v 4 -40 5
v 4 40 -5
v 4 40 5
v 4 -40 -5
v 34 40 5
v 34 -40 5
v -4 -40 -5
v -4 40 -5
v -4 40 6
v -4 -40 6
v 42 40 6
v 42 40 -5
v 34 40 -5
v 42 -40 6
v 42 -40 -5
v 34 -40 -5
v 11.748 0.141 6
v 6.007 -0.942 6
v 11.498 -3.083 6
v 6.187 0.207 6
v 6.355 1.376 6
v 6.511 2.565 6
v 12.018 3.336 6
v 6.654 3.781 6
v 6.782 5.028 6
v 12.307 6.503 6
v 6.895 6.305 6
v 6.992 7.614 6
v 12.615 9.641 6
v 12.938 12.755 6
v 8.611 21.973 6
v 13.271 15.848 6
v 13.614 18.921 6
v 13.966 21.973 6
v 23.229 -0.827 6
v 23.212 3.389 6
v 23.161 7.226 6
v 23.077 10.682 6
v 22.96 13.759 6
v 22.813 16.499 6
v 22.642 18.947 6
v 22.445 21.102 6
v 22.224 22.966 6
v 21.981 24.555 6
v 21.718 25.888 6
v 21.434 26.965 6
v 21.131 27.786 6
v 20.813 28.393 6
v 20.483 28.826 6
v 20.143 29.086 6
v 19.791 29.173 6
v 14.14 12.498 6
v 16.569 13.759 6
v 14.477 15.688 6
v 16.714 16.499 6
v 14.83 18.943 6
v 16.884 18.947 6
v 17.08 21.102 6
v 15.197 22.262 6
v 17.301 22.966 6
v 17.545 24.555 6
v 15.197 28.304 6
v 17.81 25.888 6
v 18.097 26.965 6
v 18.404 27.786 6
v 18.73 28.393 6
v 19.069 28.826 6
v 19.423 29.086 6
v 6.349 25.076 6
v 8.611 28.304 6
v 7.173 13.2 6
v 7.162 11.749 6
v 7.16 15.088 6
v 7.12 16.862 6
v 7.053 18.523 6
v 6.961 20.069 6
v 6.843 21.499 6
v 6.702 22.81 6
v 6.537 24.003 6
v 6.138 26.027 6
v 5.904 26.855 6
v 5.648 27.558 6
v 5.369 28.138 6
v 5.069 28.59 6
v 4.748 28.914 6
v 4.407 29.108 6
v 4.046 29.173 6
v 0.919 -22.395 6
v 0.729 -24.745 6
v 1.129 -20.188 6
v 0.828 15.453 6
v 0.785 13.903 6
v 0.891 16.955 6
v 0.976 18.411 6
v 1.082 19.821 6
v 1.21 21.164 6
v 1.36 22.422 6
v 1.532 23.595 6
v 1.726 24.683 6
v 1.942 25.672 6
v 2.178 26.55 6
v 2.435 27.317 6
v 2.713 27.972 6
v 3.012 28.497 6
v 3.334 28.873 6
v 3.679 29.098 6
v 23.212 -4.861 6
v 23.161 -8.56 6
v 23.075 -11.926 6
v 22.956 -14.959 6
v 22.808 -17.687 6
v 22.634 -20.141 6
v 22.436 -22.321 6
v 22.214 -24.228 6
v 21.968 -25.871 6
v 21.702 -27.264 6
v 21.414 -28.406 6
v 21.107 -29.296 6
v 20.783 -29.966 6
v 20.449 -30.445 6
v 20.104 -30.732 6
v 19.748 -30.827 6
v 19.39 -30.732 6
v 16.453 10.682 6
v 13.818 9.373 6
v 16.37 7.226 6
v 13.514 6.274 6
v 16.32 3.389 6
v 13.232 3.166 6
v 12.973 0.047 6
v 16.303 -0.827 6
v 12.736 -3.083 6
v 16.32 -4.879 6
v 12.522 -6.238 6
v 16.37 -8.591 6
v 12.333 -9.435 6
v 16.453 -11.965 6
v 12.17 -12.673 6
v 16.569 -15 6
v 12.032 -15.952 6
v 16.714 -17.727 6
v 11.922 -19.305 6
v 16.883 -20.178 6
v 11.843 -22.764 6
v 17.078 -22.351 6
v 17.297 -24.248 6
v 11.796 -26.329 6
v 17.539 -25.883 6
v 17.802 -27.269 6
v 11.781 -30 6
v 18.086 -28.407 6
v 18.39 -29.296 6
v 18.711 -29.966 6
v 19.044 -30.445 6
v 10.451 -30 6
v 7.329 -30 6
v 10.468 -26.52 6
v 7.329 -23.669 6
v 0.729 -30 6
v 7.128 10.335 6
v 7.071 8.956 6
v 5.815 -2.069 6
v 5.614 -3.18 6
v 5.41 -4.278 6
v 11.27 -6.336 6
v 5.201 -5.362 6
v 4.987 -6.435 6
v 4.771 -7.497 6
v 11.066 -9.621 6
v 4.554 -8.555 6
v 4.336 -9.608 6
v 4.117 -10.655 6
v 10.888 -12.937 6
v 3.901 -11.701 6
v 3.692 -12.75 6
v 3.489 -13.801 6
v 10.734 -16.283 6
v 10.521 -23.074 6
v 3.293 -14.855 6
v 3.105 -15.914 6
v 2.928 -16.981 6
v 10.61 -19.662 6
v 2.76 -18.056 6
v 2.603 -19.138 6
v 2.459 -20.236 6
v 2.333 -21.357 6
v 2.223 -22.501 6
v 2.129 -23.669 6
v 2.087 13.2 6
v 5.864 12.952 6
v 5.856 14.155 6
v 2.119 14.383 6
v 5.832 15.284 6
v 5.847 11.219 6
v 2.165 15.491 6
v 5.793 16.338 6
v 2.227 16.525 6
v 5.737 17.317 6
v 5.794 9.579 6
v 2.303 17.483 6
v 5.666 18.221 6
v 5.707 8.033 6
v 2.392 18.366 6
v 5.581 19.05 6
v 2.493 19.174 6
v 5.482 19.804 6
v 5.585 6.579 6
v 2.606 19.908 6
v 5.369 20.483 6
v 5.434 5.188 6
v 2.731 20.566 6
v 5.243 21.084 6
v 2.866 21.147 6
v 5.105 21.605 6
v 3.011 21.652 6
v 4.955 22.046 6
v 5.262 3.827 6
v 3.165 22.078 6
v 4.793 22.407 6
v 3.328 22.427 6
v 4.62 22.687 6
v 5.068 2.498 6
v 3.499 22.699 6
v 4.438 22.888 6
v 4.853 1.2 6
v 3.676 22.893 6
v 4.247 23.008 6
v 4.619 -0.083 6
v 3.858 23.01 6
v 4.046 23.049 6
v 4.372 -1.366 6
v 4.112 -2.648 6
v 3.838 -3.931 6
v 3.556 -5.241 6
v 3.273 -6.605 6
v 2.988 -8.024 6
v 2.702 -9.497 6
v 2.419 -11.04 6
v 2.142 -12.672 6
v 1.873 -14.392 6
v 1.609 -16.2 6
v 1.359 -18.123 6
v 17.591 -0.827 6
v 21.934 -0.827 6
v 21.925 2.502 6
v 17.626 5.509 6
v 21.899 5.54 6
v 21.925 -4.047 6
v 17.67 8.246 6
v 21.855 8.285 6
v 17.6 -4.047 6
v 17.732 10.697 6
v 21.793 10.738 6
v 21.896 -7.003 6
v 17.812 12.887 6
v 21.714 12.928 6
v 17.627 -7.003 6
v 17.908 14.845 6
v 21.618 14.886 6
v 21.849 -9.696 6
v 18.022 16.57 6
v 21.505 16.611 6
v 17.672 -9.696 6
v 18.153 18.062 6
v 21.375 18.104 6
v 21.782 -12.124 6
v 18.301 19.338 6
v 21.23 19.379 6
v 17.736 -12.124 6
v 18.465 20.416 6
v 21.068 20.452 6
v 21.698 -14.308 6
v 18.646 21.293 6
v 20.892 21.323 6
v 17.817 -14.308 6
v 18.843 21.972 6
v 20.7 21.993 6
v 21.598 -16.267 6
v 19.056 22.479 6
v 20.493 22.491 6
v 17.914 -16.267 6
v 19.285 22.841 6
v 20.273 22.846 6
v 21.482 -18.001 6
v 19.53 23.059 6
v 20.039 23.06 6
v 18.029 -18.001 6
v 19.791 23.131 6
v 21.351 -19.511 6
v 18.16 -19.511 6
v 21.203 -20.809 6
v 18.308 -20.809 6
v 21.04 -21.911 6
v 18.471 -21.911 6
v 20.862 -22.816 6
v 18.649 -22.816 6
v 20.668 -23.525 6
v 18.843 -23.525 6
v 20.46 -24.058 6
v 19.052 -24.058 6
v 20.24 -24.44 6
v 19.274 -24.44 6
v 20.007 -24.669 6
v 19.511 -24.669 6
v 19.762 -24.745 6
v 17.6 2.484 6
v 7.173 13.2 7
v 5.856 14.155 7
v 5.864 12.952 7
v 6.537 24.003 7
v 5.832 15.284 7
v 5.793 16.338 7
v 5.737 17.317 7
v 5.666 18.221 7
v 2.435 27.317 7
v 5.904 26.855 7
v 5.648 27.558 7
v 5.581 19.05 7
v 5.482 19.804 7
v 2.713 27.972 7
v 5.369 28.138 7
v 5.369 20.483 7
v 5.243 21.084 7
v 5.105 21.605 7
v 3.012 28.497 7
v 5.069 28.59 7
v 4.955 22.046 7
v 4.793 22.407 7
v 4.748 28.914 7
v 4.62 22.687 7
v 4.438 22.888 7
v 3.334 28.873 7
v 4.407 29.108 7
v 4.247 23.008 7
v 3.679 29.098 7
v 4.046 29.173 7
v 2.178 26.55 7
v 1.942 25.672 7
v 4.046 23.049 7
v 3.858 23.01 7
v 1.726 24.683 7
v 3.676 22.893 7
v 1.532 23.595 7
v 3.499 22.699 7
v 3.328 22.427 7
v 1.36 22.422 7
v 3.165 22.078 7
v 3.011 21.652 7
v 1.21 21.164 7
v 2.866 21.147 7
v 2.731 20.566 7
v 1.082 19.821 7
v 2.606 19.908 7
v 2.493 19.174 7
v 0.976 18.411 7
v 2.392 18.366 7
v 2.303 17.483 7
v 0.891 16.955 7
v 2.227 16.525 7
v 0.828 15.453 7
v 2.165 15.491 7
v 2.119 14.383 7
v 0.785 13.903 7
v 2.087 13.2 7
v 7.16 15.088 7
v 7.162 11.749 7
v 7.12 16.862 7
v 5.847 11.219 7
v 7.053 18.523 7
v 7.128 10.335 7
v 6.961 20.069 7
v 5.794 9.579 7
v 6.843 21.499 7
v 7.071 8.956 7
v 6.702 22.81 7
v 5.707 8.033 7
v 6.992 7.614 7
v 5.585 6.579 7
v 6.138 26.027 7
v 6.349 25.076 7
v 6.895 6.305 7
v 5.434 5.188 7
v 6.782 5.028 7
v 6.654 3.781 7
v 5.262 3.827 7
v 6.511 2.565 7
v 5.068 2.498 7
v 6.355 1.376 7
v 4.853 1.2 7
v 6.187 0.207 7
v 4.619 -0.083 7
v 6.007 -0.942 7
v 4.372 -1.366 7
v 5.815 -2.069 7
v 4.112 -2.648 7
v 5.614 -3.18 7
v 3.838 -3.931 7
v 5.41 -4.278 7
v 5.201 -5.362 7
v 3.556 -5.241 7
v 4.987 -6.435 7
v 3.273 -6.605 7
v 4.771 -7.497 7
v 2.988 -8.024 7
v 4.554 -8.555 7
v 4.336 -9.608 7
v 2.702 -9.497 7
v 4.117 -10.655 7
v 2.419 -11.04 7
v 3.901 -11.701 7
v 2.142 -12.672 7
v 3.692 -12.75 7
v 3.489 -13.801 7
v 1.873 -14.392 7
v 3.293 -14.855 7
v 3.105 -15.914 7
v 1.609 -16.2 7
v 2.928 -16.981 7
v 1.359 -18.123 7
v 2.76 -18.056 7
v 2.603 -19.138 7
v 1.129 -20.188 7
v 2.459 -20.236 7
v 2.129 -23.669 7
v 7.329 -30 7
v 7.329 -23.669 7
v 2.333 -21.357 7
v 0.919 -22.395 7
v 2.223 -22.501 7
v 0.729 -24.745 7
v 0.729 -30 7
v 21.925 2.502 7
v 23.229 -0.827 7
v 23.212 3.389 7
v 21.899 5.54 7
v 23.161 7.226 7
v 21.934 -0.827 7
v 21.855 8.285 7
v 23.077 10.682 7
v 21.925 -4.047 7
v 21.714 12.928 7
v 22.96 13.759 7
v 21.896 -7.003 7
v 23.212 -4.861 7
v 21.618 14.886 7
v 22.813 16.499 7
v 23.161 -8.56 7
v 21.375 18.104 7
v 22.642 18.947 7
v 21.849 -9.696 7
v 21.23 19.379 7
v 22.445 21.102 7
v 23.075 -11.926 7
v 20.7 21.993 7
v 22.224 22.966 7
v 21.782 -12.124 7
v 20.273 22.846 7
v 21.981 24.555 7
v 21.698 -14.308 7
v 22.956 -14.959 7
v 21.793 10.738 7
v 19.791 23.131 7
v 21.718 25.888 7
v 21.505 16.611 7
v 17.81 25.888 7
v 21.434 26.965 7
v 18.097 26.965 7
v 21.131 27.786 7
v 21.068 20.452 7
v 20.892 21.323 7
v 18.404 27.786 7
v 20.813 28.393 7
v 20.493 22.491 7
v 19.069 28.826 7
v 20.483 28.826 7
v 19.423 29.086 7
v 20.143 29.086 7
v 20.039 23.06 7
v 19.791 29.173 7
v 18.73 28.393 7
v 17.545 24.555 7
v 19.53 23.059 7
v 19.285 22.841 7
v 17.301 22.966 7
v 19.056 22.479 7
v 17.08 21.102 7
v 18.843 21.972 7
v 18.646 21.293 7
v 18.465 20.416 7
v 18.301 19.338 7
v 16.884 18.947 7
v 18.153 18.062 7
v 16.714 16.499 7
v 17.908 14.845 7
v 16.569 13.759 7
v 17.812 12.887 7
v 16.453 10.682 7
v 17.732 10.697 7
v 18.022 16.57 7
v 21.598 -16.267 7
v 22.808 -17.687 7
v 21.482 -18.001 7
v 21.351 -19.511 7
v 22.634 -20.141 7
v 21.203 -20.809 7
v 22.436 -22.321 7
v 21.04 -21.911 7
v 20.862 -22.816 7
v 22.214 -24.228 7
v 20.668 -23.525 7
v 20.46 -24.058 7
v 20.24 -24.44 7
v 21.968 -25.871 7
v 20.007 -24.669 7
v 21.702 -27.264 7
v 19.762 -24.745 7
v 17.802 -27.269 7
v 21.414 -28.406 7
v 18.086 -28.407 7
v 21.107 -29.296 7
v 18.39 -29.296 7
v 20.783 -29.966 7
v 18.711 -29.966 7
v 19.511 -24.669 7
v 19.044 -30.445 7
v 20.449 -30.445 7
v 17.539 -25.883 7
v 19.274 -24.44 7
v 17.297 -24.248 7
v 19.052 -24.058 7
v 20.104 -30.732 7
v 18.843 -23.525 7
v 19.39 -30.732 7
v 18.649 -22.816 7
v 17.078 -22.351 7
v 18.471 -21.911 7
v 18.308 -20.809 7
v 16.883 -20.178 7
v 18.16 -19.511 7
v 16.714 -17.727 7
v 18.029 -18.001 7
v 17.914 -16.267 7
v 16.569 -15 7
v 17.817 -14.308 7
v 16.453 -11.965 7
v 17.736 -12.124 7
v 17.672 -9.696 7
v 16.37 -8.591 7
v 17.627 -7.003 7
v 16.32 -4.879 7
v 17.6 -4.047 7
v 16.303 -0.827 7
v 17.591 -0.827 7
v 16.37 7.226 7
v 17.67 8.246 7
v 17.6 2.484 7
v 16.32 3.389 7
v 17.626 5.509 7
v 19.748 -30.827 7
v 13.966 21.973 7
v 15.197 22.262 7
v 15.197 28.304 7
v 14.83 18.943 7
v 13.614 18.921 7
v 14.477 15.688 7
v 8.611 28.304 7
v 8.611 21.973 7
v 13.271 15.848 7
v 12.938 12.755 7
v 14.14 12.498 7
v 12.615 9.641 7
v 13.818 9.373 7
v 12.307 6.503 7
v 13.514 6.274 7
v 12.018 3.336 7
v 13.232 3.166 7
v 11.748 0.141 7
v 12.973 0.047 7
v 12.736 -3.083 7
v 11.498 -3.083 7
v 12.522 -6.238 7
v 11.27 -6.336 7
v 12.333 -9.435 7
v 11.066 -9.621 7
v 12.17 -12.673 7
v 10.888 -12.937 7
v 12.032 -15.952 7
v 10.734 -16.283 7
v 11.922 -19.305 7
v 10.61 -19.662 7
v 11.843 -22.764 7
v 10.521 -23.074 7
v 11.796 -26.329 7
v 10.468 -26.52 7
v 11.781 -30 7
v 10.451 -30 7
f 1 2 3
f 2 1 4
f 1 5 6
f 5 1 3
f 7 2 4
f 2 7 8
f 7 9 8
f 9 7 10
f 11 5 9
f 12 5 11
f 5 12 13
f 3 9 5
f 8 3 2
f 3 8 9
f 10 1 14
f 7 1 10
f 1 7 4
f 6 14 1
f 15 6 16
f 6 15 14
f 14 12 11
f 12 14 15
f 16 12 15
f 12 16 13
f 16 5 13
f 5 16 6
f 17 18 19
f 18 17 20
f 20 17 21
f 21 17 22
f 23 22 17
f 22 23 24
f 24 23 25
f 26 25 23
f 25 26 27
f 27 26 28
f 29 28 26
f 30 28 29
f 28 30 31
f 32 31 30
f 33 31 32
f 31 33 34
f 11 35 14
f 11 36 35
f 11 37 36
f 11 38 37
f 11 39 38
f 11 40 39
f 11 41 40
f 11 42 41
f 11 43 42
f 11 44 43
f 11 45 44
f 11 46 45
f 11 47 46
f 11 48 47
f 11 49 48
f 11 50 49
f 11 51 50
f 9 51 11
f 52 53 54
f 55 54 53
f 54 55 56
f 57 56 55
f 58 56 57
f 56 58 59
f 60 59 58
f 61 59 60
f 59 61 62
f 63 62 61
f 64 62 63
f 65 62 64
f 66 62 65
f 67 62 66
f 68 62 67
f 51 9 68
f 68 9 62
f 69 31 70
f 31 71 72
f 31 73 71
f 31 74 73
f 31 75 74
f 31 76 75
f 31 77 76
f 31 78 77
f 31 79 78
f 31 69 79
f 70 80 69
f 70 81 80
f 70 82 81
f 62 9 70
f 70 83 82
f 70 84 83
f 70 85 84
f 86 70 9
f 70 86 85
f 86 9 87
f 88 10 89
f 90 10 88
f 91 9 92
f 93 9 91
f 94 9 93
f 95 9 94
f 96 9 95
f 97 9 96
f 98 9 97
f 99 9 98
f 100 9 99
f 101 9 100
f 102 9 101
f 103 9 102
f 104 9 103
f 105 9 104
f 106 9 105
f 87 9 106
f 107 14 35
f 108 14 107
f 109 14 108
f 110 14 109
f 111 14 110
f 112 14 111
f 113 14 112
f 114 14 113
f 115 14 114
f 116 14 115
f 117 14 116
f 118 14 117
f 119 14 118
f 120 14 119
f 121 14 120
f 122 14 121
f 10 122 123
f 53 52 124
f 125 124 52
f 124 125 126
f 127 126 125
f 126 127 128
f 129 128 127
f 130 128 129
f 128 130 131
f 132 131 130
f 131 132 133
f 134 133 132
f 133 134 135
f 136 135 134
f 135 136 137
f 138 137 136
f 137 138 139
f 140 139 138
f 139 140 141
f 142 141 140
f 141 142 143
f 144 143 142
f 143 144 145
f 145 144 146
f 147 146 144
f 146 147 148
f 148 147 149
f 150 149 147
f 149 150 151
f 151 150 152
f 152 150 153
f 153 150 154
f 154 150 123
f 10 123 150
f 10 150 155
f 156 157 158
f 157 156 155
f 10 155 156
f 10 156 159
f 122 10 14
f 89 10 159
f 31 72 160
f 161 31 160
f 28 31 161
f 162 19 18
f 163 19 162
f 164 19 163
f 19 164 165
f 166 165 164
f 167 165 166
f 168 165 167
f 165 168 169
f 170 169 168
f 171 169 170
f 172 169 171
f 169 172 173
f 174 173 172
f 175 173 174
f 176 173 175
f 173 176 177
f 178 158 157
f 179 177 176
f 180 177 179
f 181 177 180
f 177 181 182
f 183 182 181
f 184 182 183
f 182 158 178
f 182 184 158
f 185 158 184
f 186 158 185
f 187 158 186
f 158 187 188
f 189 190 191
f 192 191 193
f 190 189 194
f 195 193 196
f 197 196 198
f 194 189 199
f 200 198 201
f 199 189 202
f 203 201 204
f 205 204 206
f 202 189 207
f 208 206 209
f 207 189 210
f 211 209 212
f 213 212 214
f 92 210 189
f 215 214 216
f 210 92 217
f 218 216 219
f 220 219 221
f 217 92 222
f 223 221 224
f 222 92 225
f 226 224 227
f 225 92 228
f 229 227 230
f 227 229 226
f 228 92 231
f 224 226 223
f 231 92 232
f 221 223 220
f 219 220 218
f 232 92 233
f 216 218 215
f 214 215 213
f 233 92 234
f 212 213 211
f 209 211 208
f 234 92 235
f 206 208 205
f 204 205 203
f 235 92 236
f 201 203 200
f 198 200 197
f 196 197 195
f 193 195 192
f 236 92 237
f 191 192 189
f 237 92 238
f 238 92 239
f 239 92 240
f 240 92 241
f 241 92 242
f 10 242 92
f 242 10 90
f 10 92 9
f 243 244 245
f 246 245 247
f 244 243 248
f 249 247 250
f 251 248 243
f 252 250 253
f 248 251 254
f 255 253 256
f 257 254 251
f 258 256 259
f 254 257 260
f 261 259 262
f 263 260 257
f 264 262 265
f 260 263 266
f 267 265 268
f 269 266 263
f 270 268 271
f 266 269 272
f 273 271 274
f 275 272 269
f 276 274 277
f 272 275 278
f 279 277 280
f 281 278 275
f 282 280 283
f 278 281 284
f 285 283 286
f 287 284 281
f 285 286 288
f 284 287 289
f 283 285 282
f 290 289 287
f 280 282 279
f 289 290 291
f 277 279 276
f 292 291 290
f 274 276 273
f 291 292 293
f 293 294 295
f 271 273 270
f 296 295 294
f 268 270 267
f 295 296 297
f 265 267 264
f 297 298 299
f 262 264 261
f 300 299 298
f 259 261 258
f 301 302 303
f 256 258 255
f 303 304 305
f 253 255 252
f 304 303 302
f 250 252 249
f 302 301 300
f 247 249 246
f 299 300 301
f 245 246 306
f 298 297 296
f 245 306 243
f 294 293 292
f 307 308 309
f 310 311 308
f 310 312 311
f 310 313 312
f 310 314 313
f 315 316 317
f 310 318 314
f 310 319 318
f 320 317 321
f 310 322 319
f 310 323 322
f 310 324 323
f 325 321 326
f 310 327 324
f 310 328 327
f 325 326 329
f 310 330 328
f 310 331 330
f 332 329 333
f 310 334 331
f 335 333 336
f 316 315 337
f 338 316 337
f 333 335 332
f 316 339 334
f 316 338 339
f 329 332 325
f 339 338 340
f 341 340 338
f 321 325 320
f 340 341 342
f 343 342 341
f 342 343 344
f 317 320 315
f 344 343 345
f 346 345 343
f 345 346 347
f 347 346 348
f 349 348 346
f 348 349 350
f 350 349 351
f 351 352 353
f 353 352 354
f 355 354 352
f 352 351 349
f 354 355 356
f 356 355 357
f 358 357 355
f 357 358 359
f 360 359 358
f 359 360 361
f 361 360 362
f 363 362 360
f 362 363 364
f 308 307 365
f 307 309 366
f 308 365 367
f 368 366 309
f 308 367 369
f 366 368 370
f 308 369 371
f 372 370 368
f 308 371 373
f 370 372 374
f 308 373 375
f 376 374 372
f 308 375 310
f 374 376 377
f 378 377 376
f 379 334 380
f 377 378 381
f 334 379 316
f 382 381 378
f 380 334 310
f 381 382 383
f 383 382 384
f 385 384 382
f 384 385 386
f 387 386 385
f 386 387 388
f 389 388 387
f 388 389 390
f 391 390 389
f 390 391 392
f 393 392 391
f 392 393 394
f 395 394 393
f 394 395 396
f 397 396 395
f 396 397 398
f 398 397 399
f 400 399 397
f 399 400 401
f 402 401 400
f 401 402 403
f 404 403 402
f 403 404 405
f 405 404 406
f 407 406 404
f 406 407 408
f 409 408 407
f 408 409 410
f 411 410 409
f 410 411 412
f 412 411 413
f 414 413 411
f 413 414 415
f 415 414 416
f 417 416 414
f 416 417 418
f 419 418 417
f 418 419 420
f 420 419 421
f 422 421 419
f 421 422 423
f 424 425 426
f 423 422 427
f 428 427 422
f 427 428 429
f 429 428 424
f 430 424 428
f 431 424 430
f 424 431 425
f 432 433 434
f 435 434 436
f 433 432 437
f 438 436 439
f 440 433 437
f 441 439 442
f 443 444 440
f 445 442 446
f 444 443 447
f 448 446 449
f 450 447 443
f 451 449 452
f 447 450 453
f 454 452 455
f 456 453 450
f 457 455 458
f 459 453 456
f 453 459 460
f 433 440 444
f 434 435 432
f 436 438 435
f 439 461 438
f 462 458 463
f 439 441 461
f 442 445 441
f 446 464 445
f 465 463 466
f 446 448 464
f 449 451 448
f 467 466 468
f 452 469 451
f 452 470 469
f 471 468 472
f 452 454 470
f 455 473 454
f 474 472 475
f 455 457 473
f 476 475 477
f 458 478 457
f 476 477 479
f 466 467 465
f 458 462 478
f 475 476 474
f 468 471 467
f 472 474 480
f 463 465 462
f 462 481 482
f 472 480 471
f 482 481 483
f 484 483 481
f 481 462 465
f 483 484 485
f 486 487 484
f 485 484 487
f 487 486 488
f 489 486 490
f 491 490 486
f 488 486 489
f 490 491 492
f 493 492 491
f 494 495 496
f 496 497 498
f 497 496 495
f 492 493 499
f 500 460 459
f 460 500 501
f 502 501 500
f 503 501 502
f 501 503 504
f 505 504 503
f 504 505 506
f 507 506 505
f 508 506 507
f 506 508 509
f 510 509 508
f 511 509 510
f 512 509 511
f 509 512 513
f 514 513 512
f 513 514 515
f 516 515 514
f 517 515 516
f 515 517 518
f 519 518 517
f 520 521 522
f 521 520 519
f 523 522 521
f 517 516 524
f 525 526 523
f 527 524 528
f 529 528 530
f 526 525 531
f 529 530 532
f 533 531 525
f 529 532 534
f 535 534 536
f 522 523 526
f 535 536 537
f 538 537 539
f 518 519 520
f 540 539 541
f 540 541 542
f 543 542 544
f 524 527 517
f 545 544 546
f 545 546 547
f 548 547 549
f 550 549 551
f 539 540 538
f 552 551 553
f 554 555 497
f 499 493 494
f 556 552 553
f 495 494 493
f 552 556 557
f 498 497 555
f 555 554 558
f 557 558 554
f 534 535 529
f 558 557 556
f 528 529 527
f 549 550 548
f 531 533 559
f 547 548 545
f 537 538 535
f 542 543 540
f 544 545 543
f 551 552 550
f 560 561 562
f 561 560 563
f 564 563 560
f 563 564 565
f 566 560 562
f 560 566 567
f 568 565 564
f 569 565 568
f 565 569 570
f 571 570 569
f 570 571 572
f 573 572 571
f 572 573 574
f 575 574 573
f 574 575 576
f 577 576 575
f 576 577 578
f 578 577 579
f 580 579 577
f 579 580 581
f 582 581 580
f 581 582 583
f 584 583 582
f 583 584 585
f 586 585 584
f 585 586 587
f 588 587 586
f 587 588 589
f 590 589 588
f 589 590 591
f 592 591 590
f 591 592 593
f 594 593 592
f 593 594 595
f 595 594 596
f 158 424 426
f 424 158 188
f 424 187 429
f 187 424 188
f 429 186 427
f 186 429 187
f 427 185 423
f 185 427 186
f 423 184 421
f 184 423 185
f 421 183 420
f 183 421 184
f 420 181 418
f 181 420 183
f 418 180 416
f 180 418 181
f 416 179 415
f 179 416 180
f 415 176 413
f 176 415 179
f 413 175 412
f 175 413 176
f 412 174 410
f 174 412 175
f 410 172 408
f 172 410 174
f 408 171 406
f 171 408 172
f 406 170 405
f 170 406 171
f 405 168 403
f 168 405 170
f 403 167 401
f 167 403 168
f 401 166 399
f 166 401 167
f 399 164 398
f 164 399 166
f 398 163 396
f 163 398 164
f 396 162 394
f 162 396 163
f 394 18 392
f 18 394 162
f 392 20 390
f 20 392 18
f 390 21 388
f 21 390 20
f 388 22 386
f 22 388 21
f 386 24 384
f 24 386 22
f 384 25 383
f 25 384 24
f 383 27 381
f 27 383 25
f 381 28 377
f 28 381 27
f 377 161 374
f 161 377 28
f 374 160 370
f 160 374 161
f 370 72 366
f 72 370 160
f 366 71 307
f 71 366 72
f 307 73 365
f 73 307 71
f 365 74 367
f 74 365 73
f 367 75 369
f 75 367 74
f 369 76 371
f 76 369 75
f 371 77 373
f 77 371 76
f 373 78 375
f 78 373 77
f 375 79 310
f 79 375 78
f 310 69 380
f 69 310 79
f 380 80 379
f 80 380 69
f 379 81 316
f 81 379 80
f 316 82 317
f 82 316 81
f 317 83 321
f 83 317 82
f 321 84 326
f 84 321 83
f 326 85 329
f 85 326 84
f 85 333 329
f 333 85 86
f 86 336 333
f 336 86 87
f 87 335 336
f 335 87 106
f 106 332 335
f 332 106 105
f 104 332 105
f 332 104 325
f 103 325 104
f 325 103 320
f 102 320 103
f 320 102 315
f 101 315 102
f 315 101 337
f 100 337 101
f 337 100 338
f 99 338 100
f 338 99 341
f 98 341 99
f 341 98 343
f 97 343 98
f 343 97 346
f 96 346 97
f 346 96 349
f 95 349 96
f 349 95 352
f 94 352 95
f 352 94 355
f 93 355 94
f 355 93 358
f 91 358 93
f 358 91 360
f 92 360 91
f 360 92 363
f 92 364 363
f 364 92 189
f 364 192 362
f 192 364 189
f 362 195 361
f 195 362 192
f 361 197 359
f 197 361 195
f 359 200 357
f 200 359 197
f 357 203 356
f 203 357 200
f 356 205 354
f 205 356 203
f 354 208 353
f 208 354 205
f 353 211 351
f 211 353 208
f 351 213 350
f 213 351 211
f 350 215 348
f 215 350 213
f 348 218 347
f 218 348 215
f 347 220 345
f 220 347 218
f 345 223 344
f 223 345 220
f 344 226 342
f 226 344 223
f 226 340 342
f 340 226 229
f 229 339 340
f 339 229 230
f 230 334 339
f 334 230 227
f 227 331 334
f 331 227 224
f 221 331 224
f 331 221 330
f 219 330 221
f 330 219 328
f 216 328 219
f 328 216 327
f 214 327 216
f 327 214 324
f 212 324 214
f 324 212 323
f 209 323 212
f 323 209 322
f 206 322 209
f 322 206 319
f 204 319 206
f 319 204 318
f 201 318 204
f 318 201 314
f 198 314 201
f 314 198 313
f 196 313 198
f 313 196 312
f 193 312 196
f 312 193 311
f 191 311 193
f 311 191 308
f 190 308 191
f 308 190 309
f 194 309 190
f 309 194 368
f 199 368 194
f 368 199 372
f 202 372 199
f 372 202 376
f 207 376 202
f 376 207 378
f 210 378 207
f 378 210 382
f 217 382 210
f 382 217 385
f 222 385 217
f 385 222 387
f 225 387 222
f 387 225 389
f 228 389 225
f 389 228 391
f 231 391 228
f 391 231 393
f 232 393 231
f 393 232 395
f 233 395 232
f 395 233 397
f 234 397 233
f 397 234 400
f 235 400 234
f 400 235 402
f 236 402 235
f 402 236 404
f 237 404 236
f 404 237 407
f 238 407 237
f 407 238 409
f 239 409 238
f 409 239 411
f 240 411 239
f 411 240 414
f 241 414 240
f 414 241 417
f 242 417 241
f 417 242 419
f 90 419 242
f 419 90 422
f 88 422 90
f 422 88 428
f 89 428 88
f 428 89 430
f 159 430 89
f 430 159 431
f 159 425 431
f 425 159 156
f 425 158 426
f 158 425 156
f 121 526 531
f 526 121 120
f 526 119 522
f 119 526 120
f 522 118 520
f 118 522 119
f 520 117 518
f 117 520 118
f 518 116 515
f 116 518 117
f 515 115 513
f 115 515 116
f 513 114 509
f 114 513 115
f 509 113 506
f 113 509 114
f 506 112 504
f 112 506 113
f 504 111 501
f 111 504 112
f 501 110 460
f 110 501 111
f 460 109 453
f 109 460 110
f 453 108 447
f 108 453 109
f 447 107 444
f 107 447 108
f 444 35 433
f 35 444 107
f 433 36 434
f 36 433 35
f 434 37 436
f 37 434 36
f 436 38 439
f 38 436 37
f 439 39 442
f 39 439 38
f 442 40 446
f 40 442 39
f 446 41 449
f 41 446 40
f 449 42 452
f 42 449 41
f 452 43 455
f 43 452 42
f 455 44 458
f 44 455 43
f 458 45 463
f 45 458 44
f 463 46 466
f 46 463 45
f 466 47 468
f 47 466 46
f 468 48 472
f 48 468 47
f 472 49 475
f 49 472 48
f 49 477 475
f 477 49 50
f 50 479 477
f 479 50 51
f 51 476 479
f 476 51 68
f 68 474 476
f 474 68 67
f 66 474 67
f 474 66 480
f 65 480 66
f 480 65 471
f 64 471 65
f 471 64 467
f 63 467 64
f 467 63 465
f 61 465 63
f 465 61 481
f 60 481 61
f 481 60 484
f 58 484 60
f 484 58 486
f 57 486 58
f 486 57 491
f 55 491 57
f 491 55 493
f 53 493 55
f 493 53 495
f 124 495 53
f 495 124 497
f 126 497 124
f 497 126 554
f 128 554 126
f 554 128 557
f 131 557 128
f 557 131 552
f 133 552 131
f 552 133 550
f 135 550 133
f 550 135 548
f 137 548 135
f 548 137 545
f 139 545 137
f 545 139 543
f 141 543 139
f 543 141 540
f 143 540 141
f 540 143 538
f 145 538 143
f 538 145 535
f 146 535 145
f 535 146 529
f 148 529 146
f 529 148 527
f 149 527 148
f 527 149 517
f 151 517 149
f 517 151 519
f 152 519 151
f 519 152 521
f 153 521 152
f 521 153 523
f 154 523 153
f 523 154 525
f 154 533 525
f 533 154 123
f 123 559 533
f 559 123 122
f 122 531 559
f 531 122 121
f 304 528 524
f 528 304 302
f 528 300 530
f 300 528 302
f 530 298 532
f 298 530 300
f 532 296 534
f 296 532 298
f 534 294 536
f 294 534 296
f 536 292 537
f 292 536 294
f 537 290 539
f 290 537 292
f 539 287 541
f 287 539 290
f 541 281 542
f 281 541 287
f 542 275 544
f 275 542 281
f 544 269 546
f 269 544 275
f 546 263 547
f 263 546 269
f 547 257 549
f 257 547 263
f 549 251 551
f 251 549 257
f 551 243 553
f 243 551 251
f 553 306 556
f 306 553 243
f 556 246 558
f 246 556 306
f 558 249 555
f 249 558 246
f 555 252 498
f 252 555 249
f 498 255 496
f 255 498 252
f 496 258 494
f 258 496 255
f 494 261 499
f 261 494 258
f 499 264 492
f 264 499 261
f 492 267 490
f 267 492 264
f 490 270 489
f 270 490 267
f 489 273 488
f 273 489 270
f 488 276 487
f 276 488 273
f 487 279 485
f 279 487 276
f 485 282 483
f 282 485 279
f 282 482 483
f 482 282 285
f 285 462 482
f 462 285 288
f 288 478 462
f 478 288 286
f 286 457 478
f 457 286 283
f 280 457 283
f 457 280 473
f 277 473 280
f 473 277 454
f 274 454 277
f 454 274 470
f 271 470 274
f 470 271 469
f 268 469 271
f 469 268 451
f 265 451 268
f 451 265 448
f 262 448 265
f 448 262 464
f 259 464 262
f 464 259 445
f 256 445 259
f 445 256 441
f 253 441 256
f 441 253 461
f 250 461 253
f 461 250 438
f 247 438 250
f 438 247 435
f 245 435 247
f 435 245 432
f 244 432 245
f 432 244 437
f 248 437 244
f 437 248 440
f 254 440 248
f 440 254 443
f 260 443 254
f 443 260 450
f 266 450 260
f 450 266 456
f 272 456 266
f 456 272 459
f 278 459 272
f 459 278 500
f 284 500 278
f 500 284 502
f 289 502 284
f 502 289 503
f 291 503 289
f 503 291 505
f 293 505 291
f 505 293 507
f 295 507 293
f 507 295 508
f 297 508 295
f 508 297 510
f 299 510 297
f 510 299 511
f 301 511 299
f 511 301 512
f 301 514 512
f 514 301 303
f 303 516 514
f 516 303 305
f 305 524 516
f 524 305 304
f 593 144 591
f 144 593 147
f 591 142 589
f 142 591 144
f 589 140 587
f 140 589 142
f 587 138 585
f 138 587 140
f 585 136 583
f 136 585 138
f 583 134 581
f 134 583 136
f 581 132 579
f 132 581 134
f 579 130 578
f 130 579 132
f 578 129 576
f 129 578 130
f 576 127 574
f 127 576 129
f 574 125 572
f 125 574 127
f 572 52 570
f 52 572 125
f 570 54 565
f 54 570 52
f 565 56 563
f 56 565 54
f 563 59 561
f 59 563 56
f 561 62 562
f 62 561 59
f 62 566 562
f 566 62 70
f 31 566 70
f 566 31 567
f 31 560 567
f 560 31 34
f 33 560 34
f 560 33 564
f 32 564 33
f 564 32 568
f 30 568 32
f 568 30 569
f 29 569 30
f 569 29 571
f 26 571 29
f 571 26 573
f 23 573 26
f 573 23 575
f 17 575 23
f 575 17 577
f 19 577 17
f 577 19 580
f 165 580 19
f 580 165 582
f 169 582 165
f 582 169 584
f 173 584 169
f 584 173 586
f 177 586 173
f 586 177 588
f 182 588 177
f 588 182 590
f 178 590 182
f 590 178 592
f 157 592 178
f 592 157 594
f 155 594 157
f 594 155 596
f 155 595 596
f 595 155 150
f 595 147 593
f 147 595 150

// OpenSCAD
module bridge(
    width = 25,
    length = 80
    ){

    //Do not modified these constants
    height = 10;
    base = 8;
    bridge_thick = 1;
    length_score = 5;
    width_score = 1.5;
    magic = 0.75;

    cube([base,width,height],center=true);
    translate([length+base,0,0])cube([base,width,height],center=true);
    color("red") translate([length/2+base/2,0,height/2+bridge_thick/2])cube([length+2*base,width,bridge_thick],center=true);

    finalScore = (width * width_score) + (length * length_score);
    echo(str("Congratulation you received " , finalScore , " points"));

    mySize = (width > length) ? length : width;
    translate([0,-width/2*magic,height/2+bridge_thick])    resize([length*magic,width*magic,1]) linear_extrude(height = magic)text(str(finalScore), size=mySize/2);
}


bridge(80,30);
